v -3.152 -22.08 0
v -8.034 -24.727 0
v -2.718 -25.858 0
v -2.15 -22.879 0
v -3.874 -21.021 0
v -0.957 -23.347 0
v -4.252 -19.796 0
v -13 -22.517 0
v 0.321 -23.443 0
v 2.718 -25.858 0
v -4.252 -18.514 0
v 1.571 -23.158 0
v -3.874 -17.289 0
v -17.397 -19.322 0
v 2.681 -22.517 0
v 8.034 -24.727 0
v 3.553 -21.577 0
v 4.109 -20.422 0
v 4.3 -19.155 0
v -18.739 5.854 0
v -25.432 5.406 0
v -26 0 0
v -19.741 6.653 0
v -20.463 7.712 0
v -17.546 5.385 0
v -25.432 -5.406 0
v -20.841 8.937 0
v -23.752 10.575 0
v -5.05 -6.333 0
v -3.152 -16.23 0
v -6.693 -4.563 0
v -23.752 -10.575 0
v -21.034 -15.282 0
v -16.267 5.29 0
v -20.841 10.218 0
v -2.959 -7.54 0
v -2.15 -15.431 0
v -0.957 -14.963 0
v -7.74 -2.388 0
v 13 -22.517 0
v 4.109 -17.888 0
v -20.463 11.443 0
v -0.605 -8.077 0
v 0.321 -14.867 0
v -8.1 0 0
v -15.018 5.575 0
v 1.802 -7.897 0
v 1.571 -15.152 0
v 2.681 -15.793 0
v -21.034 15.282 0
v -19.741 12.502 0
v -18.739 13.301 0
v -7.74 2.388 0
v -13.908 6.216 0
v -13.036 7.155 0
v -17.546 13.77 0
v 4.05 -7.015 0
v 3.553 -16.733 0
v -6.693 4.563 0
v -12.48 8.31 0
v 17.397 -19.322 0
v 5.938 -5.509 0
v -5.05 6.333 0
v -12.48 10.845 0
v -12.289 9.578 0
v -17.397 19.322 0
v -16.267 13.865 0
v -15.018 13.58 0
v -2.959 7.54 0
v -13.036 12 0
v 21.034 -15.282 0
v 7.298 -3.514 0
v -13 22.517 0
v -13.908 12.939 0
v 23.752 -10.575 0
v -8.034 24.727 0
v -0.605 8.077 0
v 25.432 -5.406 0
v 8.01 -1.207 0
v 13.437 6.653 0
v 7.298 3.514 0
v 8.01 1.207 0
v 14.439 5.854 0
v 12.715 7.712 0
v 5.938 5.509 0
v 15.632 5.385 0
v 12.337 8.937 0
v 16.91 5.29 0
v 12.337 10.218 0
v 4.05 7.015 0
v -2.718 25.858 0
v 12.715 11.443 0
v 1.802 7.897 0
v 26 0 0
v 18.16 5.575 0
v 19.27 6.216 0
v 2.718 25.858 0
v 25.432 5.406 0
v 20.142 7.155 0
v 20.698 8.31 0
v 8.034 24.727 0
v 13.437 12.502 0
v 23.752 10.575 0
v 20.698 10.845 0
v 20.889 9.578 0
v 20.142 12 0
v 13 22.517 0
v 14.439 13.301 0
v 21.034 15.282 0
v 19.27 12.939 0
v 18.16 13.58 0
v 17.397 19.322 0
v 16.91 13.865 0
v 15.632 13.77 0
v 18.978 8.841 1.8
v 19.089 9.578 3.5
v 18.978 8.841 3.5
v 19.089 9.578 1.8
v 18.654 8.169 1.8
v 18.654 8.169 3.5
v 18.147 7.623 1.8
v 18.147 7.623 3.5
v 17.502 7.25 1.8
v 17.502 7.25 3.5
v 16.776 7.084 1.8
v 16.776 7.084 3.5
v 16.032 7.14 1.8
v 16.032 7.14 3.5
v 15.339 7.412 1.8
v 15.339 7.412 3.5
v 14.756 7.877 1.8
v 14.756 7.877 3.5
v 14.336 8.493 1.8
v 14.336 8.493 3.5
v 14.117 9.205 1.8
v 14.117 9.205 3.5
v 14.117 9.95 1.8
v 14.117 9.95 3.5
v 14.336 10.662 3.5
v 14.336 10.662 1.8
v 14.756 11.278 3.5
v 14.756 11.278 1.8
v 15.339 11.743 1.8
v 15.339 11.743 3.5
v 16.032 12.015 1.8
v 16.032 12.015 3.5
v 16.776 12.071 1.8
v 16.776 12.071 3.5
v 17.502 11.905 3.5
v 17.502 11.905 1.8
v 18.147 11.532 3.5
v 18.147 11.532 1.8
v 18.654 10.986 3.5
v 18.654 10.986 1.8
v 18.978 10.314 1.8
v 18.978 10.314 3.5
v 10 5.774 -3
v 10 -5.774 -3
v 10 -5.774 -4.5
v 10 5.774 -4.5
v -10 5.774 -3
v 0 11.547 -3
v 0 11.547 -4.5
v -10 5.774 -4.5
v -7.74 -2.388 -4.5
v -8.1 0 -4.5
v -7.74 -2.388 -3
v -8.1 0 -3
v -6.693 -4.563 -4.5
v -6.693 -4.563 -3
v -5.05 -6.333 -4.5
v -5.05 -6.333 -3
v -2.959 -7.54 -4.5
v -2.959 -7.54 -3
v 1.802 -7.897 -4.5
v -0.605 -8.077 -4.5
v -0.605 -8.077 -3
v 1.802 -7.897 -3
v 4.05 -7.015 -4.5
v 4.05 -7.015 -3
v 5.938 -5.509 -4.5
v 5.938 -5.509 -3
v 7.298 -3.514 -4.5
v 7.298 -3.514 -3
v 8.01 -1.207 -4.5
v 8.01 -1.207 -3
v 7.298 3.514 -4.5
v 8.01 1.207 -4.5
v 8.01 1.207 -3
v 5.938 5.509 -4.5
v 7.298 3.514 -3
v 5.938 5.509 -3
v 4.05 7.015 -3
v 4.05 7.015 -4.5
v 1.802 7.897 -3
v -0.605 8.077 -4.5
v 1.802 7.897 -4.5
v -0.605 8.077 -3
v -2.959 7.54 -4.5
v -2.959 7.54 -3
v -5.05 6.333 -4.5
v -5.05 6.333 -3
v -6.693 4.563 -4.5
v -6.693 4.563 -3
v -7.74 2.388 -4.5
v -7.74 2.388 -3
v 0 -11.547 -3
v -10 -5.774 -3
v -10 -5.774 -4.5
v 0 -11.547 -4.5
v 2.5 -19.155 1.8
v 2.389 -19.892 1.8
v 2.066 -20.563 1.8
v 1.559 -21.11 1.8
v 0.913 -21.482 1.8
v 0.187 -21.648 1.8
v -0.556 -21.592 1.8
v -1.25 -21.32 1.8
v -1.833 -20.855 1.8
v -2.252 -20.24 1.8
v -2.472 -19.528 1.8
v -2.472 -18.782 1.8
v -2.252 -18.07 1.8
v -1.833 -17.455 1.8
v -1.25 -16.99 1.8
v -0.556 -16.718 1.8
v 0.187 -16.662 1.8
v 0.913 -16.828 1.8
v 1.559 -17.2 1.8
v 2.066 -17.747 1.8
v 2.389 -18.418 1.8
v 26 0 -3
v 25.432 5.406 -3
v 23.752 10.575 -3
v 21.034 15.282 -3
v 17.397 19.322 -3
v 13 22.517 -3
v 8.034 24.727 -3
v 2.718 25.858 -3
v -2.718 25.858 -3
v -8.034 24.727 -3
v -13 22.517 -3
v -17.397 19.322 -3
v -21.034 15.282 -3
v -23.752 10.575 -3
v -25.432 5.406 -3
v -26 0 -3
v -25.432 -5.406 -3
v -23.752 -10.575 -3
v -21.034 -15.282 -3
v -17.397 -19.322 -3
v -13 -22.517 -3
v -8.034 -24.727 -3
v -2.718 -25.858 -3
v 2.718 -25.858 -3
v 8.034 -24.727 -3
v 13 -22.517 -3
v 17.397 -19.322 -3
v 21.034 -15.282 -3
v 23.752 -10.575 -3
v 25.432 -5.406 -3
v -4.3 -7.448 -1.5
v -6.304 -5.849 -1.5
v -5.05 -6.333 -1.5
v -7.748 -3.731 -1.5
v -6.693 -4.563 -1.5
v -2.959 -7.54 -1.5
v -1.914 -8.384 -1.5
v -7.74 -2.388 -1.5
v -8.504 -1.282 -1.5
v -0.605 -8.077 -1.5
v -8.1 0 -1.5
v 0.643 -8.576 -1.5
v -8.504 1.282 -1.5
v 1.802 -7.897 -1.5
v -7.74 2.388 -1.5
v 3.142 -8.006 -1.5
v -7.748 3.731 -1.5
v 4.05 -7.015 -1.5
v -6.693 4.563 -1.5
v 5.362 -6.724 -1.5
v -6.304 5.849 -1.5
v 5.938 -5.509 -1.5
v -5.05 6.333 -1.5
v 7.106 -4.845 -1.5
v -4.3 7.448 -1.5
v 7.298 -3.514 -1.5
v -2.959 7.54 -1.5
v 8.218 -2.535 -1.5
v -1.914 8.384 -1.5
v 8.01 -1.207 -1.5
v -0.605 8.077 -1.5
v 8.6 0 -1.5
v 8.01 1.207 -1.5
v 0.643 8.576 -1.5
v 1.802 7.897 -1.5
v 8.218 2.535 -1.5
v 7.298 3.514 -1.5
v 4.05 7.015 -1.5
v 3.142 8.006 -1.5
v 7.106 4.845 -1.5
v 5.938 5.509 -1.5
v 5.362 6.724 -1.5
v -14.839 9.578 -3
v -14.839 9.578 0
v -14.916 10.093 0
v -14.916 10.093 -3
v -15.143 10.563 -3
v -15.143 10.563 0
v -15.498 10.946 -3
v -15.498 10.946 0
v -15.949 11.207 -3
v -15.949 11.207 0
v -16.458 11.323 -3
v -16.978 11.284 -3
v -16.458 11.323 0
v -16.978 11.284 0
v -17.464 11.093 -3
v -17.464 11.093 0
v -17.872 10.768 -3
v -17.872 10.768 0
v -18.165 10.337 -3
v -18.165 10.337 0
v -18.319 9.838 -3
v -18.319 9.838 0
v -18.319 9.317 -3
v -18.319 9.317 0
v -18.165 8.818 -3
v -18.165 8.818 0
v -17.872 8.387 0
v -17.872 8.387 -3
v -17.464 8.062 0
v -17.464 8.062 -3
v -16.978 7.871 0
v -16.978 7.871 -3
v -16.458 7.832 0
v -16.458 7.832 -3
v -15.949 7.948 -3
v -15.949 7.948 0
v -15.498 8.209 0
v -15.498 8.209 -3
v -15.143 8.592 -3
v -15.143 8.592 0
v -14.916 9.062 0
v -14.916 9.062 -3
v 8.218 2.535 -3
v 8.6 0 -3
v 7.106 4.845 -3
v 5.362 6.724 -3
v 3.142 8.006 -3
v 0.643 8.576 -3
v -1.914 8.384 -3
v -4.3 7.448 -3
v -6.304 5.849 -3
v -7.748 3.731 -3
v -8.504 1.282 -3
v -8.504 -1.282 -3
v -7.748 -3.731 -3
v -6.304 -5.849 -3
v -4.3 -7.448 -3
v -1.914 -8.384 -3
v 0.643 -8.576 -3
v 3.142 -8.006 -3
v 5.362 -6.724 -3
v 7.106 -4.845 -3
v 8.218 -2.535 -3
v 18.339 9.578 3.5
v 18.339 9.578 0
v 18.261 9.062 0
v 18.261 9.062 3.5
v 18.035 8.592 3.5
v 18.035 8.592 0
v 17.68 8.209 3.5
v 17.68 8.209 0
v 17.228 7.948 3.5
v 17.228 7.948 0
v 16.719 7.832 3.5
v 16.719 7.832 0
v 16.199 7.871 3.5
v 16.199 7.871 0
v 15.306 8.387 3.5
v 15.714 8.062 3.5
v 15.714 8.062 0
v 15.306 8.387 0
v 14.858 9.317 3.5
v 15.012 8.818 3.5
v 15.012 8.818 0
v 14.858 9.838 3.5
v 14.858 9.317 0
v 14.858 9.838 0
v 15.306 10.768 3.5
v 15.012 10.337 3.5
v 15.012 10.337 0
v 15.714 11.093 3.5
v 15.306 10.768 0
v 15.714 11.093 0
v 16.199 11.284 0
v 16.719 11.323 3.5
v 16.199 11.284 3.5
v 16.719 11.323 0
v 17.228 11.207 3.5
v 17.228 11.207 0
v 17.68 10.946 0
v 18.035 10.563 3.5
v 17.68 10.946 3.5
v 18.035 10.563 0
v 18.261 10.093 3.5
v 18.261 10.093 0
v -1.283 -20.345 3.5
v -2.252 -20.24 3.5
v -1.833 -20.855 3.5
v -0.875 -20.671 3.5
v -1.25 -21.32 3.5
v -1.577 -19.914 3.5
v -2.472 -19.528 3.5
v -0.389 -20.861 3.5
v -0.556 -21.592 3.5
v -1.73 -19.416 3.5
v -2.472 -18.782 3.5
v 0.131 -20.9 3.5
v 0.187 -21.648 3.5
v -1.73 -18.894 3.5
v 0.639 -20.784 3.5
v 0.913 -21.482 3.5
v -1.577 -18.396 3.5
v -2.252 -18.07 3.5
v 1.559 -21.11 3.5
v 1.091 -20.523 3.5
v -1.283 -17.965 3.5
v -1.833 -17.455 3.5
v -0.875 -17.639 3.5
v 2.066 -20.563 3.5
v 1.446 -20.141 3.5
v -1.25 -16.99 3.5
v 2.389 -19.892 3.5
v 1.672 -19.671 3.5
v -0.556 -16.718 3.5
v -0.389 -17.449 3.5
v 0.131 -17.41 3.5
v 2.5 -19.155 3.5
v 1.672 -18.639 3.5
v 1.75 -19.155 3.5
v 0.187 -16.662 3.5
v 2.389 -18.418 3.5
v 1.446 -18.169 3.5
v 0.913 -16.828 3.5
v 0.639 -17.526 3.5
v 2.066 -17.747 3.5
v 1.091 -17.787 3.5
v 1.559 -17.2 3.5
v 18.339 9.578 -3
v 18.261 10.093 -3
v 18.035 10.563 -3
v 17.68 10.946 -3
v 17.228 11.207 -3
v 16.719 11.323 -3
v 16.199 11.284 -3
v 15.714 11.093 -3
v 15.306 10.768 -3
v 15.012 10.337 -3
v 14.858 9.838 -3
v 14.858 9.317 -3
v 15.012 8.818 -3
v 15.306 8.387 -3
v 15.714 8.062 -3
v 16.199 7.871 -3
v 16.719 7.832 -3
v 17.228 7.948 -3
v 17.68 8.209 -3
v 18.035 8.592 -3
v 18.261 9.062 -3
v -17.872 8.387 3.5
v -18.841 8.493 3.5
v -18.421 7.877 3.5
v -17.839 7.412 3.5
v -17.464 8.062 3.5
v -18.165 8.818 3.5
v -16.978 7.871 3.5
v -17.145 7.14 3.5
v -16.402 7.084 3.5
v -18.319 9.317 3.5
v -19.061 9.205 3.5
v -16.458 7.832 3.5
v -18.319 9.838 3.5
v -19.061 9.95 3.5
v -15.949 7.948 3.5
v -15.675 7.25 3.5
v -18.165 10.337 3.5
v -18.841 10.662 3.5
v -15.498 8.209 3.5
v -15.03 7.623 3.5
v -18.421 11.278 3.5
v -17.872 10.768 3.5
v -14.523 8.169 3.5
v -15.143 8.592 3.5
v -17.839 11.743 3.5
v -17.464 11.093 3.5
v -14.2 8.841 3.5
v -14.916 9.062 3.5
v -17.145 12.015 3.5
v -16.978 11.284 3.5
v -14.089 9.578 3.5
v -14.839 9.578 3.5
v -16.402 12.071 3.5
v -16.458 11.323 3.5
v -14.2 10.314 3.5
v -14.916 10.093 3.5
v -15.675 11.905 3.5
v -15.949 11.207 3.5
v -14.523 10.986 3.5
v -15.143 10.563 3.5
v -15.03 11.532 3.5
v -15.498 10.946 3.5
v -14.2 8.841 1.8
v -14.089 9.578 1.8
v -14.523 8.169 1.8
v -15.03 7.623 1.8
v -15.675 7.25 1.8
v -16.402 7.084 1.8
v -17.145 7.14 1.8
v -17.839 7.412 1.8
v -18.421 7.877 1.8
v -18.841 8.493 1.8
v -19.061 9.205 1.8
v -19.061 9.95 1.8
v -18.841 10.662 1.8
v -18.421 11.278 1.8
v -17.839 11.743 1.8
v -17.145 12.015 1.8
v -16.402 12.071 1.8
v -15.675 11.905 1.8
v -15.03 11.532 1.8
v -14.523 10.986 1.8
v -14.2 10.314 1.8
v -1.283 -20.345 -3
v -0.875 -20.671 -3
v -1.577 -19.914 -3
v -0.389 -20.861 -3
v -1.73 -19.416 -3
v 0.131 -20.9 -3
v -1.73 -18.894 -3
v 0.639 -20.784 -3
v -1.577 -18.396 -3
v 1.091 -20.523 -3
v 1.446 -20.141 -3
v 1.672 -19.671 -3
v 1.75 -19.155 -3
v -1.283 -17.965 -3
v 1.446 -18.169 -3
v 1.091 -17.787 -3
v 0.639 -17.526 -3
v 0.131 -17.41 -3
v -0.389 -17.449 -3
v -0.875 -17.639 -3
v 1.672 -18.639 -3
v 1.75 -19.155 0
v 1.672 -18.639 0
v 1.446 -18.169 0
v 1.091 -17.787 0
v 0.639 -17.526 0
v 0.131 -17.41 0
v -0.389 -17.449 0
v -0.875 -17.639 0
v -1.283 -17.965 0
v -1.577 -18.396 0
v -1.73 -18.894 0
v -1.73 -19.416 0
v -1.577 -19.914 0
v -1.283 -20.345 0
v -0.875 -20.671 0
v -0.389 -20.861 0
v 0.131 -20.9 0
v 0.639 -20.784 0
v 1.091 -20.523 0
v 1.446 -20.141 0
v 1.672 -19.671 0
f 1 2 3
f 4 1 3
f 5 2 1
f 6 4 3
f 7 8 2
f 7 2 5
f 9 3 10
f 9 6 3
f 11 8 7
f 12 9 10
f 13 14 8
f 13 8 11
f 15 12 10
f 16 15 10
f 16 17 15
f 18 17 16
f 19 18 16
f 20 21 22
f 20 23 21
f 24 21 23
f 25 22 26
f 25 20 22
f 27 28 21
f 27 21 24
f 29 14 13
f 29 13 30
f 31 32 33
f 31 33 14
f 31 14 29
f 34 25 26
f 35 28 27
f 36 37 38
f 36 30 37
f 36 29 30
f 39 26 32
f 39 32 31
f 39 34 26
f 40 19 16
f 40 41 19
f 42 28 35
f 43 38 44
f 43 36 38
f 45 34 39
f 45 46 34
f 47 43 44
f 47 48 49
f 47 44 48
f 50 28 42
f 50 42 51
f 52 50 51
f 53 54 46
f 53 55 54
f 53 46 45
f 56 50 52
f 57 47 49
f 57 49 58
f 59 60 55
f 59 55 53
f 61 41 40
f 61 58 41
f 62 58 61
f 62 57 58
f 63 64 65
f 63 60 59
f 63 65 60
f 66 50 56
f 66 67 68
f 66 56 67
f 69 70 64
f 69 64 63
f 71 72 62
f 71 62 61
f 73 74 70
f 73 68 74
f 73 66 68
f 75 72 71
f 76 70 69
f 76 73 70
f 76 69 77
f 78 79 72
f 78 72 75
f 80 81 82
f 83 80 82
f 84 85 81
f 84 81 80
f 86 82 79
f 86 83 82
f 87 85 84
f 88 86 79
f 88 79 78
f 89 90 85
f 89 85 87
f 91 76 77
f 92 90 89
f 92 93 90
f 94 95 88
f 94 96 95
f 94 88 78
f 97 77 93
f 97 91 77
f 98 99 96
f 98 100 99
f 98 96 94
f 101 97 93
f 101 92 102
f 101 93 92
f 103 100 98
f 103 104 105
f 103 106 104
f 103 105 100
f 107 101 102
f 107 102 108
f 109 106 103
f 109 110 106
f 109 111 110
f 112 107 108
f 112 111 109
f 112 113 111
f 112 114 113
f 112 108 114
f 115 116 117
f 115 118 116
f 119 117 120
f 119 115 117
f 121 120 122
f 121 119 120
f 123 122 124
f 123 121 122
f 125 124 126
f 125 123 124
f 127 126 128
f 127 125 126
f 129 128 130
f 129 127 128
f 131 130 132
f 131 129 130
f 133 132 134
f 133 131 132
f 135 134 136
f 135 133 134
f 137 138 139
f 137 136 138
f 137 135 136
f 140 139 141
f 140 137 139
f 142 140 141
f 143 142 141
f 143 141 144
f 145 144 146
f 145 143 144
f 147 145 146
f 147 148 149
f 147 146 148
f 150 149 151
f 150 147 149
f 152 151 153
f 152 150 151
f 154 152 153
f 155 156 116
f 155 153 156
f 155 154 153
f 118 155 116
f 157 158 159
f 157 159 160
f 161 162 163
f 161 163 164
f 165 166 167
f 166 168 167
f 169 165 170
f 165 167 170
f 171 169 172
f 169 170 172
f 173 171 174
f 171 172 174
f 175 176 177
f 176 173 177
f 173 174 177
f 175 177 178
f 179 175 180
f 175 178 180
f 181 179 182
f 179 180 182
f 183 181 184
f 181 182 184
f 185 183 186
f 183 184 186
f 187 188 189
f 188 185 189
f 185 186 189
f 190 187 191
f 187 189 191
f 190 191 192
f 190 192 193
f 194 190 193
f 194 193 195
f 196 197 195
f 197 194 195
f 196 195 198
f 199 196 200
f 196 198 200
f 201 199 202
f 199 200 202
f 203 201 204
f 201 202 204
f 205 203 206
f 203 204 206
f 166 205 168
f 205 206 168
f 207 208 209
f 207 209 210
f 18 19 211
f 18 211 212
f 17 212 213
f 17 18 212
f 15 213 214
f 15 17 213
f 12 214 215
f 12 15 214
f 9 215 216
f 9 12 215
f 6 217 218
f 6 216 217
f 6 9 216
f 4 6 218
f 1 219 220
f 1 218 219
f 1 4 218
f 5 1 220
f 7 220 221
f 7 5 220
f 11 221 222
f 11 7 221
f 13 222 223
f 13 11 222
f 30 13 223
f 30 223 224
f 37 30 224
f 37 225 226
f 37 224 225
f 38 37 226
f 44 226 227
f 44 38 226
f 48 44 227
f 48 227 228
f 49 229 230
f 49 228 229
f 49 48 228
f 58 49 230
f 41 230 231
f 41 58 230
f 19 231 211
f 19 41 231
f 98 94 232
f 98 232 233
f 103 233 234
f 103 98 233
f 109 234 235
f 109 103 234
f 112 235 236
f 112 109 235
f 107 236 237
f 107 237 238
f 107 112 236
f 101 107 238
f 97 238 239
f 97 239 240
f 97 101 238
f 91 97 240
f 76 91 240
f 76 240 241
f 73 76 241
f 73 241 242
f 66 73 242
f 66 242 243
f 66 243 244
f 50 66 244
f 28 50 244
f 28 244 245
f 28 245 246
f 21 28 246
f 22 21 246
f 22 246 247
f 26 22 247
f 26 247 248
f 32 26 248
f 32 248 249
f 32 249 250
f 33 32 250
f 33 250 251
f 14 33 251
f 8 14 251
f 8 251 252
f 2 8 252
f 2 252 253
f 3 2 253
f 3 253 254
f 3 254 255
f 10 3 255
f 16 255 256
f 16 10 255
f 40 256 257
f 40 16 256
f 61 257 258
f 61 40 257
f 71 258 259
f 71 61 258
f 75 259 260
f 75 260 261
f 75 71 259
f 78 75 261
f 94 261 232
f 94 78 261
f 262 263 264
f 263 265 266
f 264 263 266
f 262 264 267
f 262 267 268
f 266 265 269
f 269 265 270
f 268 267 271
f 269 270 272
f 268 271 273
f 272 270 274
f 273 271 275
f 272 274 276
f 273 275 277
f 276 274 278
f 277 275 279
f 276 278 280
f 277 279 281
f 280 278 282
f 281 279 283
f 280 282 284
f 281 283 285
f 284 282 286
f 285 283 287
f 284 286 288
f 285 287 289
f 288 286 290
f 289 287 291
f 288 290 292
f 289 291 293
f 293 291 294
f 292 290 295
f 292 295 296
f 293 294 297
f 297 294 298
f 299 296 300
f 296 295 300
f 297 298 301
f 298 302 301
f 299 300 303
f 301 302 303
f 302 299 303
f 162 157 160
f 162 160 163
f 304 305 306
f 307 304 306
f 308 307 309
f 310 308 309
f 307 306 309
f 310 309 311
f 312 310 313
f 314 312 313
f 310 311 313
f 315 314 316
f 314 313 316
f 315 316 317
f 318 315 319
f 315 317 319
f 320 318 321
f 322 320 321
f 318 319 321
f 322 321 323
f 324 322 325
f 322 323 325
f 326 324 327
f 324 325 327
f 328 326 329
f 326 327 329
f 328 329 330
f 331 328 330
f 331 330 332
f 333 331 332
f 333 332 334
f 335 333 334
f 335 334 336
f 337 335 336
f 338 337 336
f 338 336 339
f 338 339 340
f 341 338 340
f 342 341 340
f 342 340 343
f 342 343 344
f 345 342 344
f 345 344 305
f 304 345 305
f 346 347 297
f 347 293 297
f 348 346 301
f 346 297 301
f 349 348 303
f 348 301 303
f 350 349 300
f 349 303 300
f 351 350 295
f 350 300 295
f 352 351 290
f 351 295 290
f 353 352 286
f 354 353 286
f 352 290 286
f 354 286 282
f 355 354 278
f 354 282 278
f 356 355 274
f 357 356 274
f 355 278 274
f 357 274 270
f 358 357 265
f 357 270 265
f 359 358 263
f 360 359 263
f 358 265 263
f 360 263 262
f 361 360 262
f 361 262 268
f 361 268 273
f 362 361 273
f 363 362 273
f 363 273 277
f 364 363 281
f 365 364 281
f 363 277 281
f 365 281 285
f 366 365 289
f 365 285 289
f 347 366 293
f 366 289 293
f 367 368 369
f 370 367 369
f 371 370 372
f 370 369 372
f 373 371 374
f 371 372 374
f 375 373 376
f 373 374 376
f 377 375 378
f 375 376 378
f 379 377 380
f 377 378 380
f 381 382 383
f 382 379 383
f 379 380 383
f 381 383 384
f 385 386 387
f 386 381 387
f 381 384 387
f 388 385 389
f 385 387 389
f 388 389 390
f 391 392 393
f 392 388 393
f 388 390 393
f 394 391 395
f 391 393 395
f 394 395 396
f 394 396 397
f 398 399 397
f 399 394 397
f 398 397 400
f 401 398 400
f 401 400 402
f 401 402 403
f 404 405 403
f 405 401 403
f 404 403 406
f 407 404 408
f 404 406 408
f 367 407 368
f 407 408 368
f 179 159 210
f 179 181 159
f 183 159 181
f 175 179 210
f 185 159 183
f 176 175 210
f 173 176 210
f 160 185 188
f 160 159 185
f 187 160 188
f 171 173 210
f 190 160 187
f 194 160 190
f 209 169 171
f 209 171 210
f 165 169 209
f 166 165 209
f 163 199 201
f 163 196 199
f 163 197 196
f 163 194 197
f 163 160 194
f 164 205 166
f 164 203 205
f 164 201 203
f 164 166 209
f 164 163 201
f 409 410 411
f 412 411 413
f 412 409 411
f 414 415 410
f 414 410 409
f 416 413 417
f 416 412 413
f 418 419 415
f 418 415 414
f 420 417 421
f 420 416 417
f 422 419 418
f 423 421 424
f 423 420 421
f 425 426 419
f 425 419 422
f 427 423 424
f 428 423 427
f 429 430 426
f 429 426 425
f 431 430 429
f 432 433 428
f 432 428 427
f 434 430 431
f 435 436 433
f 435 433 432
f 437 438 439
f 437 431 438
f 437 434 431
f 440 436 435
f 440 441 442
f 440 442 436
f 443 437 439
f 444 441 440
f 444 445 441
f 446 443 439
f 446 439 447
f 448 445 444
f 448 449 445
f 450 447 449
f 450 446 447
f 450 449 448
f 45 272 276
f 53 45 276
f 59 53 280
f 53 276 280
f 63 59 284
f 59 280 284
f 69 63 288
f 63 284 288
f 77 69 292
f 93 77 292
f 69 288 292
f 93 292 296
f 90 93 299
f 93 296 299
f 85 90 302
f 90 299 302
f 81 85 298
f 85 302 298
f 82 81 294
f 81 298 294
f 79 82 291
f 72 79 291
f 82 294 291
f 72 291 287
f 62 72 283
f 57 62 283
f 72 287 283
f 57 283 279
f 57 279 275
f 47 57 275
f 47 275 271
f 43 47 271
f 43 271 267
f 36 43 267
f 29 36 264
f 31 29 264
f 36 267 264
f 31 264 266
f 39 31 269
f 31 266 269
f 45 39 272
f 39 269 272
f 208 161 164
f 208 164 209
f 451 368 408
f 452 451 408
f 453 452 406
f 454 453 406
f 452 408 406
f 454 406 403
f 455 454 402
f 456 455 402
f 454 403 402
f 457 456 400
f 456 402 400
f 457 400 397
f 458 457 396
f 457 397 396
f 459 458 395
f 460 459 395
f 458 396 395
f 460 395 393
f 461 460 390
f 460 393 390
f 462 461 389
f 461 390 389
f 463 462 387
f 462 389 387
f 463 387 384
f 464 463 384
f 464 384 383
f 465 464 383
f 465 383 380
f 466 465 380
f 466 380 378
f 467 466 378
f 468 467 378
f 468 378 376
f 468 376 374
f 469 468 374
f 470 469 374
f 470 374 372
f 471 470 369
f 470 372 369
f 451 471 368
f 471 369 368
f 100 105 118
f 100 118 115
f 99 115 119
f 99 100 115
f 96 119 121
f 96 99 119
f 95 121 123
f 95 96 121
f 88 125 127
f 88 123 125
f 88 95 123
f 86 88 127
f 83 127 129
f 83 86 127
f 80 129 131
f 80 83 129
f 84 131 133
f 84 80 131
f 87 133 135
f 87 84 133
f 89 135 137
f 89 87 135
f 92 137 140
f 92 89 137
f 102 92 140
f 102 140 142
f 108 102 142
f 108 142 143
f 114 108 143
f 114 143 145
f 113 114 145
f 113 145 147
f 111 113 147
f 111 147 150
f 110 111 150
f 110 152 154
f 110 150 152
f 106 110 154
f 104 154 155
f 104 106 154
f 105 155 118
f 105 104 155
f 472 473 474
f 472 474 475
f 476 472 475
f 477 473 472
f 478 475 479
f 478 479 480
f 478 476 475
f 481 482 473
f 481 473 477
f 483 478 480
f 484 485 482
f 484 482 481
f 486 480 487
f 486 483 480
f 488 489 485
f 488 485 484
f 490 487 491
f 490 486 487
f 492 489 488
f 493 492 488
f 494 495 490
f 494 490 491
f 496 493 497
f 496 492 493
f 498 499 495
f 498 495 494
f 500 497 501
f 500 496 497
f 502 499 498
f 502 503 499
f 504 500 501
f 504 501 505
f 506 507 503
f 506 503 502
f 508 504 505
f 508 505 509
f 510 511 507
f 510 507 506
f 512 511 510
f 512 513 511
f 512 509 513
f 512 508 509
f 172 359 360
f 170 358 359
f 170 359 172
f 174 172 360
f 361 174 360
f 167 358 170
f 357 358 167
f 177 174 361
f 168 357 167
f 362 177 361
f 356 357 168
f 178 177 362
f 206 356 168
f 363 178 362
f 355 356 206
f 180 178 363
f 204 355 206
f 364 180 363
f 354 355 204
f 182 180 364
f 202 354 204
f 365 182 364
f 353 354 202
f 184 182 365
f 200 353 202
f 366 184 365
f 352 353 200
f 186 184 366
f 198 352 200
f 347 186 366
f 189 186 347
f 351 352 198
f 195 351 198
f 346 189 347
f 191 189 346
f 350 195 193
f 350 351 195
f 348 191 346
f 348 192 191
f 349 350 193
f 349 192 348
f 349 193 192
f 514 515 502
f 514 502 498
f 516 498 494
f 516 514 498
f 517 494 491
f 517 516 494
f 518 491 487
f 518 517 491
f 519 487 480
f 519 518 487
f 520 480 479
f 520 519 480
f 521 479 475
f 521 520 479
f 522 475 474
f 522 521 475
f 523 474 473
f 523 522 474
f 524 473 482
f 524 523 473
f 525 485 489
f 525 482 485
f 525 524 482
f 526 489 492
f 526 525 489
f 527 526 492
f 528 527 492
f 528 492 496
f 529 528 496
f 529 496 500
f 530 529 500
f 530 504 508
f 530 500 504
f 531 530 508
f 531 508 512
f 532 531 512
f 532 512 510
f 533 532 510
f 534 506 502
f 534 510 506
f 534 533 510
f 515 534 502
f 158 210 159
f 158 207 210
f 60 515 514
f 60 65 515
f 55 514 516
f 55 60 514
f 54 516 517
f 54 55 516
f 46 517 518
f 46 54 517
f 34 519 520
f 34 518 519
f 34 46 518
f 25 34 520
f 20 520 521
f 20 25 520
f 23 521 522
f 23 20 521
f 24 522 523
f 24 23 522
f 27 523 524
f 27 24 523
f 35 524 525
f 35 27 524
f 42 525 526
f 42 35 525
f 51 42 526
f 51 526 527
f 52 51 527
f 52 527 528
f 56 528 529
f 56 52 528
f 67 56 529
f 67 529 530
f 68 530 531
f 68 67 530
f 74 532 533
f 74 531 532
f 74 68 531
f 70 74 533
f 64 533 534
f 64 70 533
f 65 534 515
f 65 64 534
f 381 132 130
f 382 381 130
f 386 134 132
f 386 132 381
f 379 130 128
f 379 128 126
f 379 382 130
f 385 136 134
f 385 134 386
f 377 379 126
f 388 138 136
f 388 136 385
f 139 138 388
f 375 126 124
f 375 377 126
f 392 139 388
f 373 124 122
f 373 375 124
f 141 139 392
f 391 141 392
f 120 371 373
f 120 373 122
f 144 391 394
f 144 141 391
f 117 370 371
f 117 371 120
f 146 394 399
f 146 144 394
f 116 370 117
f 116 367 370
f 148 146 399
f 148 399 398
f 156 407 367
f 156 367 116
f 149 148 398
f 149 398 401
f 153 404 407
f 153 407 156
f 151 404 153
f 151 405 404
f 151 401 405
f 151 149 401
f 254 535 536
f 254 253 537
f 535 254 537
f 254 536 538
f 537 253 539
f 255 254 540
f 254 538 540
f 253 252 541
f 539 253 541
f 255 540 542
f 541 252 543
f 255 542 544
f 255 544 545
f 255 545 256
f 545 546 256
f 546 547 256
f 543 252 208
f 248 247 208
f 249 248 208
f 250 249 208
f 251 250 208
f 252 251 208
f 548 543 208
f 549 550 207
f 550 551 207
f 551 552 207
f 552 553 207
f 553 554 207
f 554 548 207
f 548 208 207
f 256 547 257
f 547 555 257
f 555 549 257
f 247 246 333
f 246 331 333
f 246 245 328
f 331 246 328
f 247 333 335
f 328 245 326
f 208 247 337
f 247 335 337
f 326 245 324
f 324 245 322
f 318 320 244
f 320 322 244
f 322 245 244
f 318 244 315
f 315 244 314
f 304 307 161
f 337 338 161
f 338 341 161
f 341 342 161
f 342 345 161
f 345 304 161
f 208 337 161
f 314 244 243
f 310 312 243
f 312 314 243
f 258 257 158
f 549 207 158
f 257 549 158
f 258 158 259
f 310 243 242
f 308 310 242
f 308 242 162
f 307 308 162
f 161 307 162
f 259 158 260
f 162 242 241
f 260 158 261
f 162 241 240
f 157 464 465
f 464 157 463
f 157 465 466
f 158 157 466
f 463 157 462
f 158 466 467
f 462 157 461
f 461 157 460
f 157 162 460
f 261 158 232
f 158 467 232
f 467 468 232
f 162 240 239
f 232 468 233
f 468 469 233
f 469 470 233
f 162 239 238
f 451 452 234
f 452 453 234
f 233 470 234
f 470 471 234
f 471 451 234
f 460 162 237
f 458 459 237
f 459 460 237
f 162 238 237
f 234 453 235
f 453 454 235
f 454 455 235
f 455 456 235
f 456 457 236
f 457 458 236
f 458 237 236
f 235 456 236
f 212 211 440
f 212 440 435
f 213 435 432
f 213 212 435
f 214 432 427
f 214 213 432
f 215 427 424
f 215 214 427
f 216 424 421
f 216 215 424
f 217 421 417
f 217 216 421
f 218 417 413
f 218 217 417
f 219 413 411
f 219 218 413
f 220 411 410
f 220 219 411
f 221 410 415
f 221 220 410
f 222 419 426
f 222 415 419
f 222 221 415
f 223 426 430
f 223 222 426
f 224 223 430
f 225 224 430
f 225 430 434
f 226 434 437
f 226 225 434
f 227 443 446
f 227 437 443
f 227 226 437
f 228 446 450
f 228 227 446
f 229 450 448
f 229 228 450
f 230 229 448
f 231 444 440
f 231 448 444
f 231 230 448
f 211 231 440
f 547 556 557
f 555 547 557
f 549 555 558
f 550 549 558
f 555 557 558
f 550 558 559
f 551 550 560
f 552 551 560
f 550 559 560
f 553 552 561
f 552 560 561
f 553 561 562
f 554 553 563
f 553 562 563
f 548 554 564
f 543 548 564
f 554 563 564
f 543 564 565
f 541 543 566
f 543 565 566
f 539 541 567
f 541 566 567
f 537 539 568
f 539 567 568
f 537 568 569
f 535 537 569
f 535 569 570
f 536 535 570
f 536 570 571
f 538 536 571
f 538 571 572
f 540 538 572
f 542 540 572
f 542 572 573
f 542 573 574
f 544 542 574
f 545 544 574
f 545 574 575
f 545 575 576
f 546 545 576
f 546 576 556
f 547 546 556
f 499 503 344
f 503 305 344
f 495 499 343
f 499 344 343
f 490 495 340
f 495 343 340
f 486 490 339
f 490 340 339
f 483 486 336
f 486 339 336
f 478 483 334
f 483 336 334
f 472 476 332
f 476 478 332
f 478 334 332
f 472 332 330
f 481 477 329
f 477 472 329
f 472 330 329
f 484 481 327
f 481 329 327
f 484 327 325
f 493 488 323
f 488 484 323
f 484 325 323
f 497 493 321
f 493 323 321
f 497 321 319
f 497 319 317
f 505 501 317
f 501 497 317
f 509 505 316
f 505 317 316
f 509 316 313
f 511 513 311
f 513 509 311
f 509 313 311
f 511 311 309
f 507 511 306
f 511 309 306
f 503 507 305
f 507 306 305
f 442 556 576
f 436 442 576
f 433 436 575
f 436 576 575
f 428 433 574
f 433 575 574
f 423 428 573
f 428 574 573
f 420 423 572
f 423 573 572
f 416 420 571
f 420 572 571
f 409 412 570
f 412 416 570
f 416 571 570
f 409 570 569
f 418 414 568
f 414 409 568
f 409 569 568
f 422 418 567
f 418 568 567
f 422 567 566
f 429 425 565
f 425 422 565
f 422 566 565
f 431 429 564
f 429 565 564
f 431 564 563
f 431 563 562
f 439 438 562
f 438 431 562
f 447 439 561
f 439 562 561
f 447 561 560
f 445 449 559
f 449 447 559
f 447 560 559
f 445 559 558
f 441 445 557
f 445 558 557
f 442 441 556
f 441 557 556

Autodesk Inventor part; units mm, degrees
ref_plane "YZ Plane" through (0, 0, 0) normal (1, 0, 0) x (0, 1, 0)
ref_plane "XZ Plane" through (0, 0, 0) normal (0, 1, 0) x (-1, 0, 0)
sketch "Sketch3" plane through (0, 0, 0) normal (0, 0, 1) x (1, 0, 0)
  circle A0 centre (0, 0) radius 26
  dimension "d11" = 52
sketch "Sketch4" plane through (0, 0, 0) normal (0, 0, 1) x (1, 0, 0)
  circle A0 centre (0, -19.155) radius 1.75
  circle A1 centre (0, -19.155) radius 2.5
  circle A2 centre (0, -19.155) radius 5
  circle A3 centre (16.5887, 9.5775) radius 1.75
  circle A4 centre (16.5887, 9.5775) radius 2.5
  circle A5 centre (16.5887, 9.5775) radius 5
  circle A6 centre (-16.5887, 9.5775) radius 1.75
  circle A7 centre (-16.5887, 9.5775) radius 2.5
  circle A8 centre (-16.5887, 9.5775) radius 5
  point P0 (0, 0)
  dimension "d12" = 3.5
  dimension "d13" = 5
  dimension "d14" = 19.155
  dimension "d15" = 10
  dimension "d18" = 360
extrude "Extrusion1" add sketch "Sketch3" against normal blind 3
extrude "Extrusion3" add sketch "Sketch4" along normal blind 3.5 contours A1 | A4 | A7
chamfer "Chamfer1" distance 1.8 angle 45 3 edges at (14.0887, 9.5775, 0) (-19.0887, 9.5775, 0) (-2.5, -19.155, 0)
sketch "Sketch5" plane through (0, 0, -3) normal (0, 0, -1) x (-1, 0, 0)
  circle A0 centre (0, 0) radius 8.1
  dimension "d30" = 16.2
extrude "Extrusion4" cut sketch "Sketch5" against normal up to next
extrude "Extrusion8" cut sketch "Sketch4" against normal through all contours A0 | A3 | A6
sketch "Sketch8" plane through (0, 0, -3) normal (0, 0, -1) x (-1, 0, 0)
  circle A0 centre (0, 0) radius 8.1
  circle A1 centre (0, 0) radius 8.1 projected
  line L0 (10, 5.7735) -> (10, -5.7735)
  line L1 (10, -5.7735) -> (0, -11.547)
  line L2 (0, -11.547) -> (-10, -5.7735)
  line L3 (-10, -5.7735) -> (-10, 5.7735)
  line L4 (-10, 5.7735) -> (0, 11.547)
  line L5 (0, 11.547) -> (10, 5.7735)
  dimension "d46" = 10
  dimension "d53" = 16.2
extrude "Extrusion10" add sketch "Sketch8" along normal blind 1.5
sketch "Sketch9" plane through (0, 0, 0) normal (0, 0, 1) x (1, 0, 0)
  circle A0 centre (0, 0) radius 8.0468
  circle A1 centre (0, 0) radius 8.6
  dimension "d49" = 17.2
ref_plane "Work Plane2" through (0, 0, -1.5) normal (0, 0, 1) x (1, 0, 0)
extrude "Extrusion11" cut sketch "Sketch9" against normal blind 1.5 from surface at -1.5
properties part number "Planet Carrier"
